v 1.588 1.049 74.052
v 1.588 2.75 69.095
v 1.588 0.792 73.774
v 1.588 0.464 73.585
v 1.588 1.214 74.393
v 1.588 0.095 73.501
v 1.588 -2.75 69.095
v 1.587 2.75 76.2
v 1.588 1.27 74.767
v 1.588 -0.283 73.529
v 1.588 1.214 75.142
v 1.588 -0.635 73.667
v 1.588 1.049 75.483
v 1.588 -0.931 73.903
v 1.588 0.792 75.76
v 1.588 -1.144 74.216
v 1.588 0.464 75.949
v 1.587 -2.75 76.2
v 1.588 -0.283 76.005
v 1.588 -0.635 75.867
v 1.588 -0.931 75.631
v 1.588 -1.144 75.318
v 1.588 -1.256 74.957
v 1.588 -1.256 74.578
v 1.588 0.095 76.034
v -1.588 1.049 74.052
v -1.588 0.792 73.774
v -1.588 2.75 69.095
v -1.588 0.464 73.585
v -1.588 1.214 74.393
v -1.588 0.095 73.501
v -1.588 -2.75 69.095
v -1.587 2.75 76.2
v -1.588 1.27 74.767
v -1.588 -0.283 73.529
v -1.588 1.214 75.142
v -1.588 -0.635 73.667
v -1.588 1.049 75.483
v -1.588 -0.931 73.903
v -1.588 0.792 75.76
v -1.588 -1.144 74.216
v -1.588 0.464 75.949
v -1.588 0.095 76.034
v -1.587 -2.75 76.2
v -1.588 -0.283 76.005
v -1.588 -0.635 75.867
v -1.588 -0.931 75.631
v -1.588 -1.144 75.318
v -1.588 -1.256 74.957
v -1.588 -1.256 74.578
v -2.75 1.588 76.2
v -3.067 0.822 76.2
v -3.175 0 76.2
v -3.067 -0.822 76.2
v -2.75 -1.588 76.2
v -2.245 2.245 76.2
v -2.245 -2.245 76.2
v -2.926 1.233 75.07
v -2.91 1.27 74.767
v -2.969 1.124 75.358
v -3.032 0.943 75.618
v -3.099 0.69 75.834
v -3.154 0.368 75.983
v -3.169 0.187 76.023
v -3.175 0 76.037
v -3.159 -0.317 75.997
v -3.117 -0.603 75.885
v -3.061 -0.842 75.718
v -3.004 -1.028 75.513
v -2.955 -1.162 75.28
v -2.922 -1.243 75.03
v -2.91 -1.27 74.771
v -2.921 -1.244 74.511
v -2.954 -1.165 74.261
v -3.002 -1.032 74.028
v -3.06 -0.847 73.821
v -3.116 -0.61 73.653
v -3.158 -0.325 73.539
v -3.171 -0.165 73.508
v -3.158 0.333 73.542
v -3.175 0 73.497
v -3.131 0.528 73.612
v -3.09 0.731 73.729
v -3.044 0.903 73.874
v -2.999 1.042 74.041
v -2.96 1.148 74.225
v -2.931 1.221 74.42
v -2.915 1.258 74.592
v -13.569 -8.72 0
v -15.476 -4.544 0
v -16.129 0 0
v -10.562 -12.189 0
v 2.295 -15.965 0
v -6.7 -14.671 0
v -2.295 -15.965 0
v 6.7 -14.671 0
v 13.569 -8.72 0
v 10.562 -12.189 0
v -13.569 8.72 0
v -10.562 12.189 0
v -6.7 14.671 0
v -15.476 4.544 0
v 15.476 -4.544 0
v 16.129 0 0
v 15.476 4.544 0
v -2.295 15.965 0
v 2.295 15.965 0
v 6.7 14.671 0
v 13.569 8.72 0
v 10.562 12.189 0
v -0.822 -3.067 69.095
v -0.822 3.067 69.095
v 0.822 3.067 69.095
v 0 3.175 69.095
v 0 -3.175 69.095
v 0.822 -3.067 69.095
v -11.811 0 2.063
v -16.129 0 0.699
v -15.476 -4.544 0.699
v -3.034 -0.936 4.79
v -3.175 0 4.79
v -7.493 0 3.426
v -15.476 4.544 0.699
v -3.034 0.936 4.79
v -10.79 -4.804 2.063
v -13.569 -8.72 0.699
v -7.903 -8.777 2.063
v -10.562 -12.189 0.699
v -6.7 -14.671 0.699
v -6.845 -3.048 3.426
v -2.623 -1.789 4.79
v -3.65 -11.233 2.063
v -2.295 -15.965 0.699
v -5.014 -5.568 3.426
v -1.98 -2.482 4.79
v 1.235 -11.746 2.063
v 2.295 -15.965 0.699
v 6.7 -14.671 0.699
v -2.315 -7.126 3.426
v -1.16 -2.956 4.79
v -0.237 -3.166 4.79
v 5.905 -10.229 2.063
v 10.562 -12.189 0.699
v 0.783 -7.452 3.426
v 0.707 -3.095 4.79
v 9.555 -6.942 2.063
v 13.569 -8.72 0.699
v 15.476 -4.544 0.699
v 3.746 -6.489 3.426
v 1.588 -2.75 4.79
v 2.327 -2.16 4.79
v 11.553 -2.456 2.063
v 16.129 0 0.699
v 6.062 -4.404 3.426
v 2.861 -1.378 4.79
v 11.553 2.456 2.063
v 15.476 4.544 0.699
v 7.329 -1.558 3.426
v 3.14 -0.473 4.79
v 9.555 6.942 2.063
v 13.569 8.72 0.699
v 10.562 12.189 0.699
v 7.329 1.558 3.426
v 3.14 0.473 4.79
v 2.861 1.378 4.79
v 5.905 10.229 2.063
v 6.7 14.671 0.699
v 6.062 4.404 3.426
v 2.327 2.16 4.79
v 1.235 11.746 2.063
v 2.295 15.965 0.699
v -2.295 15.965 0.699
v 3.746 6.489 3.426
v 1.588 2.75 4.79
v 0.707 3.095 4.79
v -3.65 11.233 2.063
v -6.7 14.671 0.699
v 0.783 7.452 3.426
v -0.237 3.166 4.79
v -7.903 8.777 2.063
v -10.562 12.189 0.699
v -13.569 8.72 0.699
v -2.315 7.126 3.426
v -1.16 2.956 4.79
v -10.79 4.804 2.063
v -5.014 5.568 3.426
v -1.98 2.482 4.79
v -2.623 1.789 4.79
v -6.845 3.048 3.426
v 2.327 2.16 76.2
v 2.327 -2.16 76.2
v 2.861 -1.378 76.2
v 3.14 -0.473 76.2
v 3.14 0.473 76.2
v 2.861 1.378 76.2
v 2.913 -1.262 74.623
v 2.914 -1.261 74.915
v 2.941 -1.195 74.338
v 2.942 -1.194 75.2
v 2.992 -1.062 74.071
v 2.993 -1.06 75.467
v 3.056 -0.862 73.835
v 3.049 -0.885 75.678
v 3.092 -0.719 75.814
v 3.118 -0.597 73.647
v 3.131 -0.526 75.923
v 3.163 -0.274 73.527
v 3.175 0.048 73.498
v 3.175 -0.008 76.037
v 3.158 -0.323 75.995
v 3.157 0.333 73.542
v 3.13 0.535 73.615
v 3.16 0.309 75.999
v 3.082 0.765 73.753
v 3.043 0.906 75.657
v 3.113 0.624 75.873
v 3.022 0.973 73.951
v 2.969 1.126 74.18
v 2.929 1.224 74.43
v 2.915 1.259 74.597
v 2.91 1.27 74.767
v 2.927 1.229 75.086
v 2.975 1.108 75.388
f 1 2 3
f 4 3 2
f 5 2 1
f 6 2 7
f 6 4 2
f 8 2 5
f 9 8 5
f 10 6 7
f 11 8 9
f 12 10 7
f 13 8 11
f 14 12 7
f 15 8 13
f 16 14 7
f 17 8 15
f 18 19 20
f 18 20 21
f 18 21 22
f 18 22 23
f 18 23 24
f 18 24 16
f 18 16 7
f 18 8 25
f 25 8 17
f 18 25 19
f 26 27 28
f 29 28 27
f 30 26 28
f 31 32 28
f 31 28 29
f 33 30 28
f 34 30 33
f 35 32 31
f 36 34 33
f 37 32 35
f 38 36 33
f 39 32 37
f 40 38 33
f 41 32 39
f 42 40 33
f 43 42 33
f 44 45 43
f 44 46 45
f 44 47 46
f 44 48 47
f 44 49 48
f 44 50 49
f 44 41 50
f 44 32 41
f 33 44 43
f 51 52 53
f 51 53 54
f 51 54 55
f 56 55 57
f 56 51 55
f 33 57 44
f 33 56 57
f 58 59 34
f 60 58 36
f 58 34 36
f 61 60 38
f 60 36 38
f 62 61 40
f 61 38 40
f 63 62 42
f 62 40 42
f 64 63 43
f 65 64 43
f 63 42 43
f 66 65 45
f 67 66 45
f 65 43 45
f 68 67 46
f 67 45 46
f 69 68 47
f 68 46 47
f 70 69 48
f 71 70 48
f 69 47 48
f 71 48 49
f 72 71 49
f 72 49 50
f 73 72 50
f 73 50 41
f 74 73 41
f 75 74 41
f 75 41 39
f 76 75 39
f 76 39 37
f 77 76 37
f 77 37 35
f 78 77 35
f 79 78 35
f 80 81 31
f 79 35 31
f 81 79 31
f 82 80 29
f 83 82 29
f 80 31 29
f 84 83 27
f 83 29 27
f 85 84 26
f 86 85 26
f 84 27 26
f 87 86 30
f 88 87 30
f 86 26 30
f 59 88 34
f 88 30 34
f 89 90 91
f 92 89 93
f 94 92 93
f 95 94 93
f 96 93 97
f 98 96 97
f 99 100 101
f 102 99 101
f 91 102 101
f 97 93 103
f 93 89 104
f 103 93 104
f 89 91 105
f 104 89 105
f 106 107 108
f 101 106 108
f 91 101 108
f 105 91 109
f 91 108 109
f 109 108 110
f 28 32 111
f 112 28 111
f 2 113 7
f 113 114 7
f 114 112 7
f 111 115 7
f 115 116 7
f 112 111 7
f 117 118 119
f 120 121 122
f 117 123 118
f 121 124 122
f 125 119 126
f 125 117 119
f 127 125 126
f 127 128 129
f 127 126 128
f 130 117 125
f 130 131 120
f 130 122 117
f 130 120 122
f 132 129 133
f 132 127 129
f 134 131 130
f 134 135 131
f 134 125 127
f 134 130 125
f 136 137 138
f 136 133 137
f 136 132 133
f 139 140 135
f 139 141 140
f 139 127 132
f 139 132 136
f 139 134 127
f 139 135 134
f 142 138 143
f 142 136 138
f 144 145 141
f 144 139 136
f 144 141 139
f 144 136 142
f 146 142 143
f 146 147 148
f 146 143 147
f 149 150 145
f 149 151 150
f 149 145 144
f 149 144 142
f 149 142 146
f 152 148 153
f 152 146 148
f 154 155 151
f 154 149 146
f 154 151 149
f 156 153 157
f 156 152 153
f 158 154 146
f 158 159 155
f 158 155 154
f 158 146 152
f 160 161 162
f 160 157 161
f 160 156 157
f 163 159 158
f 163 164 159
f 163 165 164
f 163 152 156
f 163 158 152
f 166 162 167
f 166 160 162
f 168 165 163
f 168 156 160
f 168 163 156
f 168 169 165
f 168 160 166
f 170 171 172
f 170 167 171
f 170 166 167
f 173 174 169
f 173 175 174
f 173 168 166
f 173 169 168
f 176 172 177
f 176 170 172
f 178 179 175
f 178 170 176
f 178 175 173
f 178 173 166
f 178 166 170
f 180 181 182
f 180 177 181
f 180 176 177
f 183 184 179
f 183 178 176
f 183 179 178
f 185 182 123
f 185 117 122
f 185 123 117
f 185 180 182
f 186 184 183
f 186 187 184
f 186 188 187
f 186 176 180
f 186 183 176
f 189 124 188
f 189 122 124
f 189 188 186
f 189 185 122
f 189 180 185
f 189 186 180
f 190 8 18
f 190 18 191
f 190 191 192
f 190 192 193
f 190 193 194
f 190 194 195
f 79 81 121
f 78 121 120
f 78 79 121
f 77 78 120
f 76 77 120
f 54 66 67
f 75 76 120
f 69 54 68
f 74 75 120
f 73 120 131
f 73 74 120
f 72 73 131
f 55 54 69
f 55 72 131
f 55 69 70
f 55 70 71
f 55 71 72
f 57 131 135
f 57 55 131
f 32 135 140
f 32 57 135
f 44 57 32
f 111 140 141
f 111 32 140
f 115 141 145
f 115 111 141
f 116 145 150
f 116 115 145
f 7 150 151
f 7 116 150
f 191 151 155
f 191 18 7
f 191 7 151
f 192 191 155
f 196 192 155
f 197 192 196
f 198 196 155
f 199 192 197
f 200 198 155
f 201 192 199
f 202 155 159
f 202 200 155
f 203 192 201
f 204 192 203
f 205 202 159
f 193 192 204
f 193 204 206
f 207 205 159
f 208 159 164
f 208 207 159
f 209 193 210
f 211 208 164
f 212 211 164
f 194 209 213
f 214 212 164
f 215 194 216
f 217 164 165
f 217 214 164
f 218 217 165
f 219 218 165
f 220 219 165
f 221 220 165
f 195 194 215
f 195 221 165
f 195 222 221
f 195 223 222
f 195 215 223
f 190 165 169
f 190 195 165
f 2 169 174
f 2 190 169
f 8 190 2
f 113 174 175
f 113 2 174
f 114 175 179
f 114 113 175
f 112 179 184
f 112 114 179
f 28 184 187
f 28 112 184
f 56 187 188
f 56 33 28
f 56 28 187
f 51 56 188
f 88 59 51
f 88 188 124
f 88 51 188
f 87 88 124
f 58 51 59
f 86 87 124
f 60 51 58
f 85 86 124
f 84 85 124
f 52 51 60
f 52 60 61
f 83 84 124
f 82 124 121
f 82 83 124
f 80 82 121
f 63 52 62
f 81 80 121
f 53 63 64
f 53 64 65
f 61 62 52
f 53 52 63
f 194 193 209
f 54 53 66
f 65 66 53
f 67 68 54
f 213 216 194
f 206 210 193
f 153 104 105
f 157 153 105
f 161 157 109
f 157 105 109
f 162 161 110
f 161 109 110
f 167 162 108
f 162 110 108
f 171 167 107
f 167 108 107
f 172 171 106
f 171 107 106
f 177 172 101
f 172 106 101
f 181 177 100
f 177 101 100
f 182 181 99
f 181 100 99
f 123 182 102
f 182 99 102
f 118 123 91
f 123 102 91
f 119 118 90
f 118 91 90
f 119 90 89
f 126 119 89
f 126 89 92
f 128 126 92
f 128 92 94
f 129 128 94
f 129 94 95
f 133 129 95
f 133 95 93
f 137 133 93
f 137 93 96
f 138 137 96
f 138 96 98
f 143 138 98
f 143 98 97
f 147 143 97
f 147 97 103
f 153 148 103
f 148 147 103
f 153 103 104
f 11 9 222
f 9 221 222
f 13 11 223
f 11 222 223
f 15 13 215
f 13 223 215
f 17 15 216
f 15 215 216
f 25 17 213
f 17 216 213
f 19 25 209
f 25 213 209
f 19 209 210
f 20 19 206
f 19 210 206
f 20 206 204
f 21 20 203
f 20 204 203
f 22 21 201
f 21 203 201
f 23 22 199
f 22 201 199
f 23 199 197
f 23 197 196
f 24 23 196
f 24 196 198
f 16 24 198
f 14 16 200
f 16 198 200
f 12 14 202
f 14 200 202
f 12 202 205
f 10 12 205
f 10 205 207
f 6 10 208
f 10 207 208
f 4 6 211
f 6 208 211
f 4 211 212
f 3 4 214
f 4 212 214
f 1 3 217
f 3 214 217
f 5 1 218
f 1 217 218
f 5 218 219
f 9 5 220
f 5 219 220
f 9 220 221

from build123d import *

# Parameters (mm, degrees)
F0_R     = 16.129
F1_DEPTH = 76.2
F4_W     = 3.175
F4_H     = 10.16
F5_DEPTH = 12.7
F6_R     = 1.27
F7_DEPTH = 12.7
F8_DEPTH = 2.54


with BuildPart() as f1:
    # F0 (on Top) → F1 (new body)
    with BuildSketch(Plane.XY):
        Circle(F0_R)
    extrude(amount=F1_DEPTH)

    # F2 (on Front) → F3 (revolve, cut)
    with BuildSketch(Plane.XZ):
        Polygon((-18.3443464339, 0), (-3.175, 4.7896225005), (-3.175, 89.8051410913), (-18.3443464339, 89.8051410913), align=None)
    revolve(axis=Axis((0, 0, 76.2), (0, 0, 1)), mode=Mode.SUBTRACT)

    # F4 (on Front) → F5 (cut, symmetric)
    with BuildSketch(Plane.XZ):
        with Locations((0, 76.7151042819)):
            Rectangle(F4_W, F4_H)
    extrude(amount=F5_DEPTH, both=True, mode=Mode.SUBTRACT)

    # F6 (on Right) → F7 (cut, symmetric)
    with BuildSketch(Plane.YZ):
        with Locations((0, 74.7672840953)):
            Circle(F6_R)
    extrude(amount=F7_DEPTH, both=True, mode=Mode.SUBTRACT)

    # F8 (cut): a face of the model
    f8_faces = [f1.faces().sort_by_distance(p)[0] for p in [
        (0, 0, 71.6351042819),
    ]]
    extrude(f8_faces, amount=-F8_DEPTH, mode=Mode.SUBTRACT)


solid = f1.part
